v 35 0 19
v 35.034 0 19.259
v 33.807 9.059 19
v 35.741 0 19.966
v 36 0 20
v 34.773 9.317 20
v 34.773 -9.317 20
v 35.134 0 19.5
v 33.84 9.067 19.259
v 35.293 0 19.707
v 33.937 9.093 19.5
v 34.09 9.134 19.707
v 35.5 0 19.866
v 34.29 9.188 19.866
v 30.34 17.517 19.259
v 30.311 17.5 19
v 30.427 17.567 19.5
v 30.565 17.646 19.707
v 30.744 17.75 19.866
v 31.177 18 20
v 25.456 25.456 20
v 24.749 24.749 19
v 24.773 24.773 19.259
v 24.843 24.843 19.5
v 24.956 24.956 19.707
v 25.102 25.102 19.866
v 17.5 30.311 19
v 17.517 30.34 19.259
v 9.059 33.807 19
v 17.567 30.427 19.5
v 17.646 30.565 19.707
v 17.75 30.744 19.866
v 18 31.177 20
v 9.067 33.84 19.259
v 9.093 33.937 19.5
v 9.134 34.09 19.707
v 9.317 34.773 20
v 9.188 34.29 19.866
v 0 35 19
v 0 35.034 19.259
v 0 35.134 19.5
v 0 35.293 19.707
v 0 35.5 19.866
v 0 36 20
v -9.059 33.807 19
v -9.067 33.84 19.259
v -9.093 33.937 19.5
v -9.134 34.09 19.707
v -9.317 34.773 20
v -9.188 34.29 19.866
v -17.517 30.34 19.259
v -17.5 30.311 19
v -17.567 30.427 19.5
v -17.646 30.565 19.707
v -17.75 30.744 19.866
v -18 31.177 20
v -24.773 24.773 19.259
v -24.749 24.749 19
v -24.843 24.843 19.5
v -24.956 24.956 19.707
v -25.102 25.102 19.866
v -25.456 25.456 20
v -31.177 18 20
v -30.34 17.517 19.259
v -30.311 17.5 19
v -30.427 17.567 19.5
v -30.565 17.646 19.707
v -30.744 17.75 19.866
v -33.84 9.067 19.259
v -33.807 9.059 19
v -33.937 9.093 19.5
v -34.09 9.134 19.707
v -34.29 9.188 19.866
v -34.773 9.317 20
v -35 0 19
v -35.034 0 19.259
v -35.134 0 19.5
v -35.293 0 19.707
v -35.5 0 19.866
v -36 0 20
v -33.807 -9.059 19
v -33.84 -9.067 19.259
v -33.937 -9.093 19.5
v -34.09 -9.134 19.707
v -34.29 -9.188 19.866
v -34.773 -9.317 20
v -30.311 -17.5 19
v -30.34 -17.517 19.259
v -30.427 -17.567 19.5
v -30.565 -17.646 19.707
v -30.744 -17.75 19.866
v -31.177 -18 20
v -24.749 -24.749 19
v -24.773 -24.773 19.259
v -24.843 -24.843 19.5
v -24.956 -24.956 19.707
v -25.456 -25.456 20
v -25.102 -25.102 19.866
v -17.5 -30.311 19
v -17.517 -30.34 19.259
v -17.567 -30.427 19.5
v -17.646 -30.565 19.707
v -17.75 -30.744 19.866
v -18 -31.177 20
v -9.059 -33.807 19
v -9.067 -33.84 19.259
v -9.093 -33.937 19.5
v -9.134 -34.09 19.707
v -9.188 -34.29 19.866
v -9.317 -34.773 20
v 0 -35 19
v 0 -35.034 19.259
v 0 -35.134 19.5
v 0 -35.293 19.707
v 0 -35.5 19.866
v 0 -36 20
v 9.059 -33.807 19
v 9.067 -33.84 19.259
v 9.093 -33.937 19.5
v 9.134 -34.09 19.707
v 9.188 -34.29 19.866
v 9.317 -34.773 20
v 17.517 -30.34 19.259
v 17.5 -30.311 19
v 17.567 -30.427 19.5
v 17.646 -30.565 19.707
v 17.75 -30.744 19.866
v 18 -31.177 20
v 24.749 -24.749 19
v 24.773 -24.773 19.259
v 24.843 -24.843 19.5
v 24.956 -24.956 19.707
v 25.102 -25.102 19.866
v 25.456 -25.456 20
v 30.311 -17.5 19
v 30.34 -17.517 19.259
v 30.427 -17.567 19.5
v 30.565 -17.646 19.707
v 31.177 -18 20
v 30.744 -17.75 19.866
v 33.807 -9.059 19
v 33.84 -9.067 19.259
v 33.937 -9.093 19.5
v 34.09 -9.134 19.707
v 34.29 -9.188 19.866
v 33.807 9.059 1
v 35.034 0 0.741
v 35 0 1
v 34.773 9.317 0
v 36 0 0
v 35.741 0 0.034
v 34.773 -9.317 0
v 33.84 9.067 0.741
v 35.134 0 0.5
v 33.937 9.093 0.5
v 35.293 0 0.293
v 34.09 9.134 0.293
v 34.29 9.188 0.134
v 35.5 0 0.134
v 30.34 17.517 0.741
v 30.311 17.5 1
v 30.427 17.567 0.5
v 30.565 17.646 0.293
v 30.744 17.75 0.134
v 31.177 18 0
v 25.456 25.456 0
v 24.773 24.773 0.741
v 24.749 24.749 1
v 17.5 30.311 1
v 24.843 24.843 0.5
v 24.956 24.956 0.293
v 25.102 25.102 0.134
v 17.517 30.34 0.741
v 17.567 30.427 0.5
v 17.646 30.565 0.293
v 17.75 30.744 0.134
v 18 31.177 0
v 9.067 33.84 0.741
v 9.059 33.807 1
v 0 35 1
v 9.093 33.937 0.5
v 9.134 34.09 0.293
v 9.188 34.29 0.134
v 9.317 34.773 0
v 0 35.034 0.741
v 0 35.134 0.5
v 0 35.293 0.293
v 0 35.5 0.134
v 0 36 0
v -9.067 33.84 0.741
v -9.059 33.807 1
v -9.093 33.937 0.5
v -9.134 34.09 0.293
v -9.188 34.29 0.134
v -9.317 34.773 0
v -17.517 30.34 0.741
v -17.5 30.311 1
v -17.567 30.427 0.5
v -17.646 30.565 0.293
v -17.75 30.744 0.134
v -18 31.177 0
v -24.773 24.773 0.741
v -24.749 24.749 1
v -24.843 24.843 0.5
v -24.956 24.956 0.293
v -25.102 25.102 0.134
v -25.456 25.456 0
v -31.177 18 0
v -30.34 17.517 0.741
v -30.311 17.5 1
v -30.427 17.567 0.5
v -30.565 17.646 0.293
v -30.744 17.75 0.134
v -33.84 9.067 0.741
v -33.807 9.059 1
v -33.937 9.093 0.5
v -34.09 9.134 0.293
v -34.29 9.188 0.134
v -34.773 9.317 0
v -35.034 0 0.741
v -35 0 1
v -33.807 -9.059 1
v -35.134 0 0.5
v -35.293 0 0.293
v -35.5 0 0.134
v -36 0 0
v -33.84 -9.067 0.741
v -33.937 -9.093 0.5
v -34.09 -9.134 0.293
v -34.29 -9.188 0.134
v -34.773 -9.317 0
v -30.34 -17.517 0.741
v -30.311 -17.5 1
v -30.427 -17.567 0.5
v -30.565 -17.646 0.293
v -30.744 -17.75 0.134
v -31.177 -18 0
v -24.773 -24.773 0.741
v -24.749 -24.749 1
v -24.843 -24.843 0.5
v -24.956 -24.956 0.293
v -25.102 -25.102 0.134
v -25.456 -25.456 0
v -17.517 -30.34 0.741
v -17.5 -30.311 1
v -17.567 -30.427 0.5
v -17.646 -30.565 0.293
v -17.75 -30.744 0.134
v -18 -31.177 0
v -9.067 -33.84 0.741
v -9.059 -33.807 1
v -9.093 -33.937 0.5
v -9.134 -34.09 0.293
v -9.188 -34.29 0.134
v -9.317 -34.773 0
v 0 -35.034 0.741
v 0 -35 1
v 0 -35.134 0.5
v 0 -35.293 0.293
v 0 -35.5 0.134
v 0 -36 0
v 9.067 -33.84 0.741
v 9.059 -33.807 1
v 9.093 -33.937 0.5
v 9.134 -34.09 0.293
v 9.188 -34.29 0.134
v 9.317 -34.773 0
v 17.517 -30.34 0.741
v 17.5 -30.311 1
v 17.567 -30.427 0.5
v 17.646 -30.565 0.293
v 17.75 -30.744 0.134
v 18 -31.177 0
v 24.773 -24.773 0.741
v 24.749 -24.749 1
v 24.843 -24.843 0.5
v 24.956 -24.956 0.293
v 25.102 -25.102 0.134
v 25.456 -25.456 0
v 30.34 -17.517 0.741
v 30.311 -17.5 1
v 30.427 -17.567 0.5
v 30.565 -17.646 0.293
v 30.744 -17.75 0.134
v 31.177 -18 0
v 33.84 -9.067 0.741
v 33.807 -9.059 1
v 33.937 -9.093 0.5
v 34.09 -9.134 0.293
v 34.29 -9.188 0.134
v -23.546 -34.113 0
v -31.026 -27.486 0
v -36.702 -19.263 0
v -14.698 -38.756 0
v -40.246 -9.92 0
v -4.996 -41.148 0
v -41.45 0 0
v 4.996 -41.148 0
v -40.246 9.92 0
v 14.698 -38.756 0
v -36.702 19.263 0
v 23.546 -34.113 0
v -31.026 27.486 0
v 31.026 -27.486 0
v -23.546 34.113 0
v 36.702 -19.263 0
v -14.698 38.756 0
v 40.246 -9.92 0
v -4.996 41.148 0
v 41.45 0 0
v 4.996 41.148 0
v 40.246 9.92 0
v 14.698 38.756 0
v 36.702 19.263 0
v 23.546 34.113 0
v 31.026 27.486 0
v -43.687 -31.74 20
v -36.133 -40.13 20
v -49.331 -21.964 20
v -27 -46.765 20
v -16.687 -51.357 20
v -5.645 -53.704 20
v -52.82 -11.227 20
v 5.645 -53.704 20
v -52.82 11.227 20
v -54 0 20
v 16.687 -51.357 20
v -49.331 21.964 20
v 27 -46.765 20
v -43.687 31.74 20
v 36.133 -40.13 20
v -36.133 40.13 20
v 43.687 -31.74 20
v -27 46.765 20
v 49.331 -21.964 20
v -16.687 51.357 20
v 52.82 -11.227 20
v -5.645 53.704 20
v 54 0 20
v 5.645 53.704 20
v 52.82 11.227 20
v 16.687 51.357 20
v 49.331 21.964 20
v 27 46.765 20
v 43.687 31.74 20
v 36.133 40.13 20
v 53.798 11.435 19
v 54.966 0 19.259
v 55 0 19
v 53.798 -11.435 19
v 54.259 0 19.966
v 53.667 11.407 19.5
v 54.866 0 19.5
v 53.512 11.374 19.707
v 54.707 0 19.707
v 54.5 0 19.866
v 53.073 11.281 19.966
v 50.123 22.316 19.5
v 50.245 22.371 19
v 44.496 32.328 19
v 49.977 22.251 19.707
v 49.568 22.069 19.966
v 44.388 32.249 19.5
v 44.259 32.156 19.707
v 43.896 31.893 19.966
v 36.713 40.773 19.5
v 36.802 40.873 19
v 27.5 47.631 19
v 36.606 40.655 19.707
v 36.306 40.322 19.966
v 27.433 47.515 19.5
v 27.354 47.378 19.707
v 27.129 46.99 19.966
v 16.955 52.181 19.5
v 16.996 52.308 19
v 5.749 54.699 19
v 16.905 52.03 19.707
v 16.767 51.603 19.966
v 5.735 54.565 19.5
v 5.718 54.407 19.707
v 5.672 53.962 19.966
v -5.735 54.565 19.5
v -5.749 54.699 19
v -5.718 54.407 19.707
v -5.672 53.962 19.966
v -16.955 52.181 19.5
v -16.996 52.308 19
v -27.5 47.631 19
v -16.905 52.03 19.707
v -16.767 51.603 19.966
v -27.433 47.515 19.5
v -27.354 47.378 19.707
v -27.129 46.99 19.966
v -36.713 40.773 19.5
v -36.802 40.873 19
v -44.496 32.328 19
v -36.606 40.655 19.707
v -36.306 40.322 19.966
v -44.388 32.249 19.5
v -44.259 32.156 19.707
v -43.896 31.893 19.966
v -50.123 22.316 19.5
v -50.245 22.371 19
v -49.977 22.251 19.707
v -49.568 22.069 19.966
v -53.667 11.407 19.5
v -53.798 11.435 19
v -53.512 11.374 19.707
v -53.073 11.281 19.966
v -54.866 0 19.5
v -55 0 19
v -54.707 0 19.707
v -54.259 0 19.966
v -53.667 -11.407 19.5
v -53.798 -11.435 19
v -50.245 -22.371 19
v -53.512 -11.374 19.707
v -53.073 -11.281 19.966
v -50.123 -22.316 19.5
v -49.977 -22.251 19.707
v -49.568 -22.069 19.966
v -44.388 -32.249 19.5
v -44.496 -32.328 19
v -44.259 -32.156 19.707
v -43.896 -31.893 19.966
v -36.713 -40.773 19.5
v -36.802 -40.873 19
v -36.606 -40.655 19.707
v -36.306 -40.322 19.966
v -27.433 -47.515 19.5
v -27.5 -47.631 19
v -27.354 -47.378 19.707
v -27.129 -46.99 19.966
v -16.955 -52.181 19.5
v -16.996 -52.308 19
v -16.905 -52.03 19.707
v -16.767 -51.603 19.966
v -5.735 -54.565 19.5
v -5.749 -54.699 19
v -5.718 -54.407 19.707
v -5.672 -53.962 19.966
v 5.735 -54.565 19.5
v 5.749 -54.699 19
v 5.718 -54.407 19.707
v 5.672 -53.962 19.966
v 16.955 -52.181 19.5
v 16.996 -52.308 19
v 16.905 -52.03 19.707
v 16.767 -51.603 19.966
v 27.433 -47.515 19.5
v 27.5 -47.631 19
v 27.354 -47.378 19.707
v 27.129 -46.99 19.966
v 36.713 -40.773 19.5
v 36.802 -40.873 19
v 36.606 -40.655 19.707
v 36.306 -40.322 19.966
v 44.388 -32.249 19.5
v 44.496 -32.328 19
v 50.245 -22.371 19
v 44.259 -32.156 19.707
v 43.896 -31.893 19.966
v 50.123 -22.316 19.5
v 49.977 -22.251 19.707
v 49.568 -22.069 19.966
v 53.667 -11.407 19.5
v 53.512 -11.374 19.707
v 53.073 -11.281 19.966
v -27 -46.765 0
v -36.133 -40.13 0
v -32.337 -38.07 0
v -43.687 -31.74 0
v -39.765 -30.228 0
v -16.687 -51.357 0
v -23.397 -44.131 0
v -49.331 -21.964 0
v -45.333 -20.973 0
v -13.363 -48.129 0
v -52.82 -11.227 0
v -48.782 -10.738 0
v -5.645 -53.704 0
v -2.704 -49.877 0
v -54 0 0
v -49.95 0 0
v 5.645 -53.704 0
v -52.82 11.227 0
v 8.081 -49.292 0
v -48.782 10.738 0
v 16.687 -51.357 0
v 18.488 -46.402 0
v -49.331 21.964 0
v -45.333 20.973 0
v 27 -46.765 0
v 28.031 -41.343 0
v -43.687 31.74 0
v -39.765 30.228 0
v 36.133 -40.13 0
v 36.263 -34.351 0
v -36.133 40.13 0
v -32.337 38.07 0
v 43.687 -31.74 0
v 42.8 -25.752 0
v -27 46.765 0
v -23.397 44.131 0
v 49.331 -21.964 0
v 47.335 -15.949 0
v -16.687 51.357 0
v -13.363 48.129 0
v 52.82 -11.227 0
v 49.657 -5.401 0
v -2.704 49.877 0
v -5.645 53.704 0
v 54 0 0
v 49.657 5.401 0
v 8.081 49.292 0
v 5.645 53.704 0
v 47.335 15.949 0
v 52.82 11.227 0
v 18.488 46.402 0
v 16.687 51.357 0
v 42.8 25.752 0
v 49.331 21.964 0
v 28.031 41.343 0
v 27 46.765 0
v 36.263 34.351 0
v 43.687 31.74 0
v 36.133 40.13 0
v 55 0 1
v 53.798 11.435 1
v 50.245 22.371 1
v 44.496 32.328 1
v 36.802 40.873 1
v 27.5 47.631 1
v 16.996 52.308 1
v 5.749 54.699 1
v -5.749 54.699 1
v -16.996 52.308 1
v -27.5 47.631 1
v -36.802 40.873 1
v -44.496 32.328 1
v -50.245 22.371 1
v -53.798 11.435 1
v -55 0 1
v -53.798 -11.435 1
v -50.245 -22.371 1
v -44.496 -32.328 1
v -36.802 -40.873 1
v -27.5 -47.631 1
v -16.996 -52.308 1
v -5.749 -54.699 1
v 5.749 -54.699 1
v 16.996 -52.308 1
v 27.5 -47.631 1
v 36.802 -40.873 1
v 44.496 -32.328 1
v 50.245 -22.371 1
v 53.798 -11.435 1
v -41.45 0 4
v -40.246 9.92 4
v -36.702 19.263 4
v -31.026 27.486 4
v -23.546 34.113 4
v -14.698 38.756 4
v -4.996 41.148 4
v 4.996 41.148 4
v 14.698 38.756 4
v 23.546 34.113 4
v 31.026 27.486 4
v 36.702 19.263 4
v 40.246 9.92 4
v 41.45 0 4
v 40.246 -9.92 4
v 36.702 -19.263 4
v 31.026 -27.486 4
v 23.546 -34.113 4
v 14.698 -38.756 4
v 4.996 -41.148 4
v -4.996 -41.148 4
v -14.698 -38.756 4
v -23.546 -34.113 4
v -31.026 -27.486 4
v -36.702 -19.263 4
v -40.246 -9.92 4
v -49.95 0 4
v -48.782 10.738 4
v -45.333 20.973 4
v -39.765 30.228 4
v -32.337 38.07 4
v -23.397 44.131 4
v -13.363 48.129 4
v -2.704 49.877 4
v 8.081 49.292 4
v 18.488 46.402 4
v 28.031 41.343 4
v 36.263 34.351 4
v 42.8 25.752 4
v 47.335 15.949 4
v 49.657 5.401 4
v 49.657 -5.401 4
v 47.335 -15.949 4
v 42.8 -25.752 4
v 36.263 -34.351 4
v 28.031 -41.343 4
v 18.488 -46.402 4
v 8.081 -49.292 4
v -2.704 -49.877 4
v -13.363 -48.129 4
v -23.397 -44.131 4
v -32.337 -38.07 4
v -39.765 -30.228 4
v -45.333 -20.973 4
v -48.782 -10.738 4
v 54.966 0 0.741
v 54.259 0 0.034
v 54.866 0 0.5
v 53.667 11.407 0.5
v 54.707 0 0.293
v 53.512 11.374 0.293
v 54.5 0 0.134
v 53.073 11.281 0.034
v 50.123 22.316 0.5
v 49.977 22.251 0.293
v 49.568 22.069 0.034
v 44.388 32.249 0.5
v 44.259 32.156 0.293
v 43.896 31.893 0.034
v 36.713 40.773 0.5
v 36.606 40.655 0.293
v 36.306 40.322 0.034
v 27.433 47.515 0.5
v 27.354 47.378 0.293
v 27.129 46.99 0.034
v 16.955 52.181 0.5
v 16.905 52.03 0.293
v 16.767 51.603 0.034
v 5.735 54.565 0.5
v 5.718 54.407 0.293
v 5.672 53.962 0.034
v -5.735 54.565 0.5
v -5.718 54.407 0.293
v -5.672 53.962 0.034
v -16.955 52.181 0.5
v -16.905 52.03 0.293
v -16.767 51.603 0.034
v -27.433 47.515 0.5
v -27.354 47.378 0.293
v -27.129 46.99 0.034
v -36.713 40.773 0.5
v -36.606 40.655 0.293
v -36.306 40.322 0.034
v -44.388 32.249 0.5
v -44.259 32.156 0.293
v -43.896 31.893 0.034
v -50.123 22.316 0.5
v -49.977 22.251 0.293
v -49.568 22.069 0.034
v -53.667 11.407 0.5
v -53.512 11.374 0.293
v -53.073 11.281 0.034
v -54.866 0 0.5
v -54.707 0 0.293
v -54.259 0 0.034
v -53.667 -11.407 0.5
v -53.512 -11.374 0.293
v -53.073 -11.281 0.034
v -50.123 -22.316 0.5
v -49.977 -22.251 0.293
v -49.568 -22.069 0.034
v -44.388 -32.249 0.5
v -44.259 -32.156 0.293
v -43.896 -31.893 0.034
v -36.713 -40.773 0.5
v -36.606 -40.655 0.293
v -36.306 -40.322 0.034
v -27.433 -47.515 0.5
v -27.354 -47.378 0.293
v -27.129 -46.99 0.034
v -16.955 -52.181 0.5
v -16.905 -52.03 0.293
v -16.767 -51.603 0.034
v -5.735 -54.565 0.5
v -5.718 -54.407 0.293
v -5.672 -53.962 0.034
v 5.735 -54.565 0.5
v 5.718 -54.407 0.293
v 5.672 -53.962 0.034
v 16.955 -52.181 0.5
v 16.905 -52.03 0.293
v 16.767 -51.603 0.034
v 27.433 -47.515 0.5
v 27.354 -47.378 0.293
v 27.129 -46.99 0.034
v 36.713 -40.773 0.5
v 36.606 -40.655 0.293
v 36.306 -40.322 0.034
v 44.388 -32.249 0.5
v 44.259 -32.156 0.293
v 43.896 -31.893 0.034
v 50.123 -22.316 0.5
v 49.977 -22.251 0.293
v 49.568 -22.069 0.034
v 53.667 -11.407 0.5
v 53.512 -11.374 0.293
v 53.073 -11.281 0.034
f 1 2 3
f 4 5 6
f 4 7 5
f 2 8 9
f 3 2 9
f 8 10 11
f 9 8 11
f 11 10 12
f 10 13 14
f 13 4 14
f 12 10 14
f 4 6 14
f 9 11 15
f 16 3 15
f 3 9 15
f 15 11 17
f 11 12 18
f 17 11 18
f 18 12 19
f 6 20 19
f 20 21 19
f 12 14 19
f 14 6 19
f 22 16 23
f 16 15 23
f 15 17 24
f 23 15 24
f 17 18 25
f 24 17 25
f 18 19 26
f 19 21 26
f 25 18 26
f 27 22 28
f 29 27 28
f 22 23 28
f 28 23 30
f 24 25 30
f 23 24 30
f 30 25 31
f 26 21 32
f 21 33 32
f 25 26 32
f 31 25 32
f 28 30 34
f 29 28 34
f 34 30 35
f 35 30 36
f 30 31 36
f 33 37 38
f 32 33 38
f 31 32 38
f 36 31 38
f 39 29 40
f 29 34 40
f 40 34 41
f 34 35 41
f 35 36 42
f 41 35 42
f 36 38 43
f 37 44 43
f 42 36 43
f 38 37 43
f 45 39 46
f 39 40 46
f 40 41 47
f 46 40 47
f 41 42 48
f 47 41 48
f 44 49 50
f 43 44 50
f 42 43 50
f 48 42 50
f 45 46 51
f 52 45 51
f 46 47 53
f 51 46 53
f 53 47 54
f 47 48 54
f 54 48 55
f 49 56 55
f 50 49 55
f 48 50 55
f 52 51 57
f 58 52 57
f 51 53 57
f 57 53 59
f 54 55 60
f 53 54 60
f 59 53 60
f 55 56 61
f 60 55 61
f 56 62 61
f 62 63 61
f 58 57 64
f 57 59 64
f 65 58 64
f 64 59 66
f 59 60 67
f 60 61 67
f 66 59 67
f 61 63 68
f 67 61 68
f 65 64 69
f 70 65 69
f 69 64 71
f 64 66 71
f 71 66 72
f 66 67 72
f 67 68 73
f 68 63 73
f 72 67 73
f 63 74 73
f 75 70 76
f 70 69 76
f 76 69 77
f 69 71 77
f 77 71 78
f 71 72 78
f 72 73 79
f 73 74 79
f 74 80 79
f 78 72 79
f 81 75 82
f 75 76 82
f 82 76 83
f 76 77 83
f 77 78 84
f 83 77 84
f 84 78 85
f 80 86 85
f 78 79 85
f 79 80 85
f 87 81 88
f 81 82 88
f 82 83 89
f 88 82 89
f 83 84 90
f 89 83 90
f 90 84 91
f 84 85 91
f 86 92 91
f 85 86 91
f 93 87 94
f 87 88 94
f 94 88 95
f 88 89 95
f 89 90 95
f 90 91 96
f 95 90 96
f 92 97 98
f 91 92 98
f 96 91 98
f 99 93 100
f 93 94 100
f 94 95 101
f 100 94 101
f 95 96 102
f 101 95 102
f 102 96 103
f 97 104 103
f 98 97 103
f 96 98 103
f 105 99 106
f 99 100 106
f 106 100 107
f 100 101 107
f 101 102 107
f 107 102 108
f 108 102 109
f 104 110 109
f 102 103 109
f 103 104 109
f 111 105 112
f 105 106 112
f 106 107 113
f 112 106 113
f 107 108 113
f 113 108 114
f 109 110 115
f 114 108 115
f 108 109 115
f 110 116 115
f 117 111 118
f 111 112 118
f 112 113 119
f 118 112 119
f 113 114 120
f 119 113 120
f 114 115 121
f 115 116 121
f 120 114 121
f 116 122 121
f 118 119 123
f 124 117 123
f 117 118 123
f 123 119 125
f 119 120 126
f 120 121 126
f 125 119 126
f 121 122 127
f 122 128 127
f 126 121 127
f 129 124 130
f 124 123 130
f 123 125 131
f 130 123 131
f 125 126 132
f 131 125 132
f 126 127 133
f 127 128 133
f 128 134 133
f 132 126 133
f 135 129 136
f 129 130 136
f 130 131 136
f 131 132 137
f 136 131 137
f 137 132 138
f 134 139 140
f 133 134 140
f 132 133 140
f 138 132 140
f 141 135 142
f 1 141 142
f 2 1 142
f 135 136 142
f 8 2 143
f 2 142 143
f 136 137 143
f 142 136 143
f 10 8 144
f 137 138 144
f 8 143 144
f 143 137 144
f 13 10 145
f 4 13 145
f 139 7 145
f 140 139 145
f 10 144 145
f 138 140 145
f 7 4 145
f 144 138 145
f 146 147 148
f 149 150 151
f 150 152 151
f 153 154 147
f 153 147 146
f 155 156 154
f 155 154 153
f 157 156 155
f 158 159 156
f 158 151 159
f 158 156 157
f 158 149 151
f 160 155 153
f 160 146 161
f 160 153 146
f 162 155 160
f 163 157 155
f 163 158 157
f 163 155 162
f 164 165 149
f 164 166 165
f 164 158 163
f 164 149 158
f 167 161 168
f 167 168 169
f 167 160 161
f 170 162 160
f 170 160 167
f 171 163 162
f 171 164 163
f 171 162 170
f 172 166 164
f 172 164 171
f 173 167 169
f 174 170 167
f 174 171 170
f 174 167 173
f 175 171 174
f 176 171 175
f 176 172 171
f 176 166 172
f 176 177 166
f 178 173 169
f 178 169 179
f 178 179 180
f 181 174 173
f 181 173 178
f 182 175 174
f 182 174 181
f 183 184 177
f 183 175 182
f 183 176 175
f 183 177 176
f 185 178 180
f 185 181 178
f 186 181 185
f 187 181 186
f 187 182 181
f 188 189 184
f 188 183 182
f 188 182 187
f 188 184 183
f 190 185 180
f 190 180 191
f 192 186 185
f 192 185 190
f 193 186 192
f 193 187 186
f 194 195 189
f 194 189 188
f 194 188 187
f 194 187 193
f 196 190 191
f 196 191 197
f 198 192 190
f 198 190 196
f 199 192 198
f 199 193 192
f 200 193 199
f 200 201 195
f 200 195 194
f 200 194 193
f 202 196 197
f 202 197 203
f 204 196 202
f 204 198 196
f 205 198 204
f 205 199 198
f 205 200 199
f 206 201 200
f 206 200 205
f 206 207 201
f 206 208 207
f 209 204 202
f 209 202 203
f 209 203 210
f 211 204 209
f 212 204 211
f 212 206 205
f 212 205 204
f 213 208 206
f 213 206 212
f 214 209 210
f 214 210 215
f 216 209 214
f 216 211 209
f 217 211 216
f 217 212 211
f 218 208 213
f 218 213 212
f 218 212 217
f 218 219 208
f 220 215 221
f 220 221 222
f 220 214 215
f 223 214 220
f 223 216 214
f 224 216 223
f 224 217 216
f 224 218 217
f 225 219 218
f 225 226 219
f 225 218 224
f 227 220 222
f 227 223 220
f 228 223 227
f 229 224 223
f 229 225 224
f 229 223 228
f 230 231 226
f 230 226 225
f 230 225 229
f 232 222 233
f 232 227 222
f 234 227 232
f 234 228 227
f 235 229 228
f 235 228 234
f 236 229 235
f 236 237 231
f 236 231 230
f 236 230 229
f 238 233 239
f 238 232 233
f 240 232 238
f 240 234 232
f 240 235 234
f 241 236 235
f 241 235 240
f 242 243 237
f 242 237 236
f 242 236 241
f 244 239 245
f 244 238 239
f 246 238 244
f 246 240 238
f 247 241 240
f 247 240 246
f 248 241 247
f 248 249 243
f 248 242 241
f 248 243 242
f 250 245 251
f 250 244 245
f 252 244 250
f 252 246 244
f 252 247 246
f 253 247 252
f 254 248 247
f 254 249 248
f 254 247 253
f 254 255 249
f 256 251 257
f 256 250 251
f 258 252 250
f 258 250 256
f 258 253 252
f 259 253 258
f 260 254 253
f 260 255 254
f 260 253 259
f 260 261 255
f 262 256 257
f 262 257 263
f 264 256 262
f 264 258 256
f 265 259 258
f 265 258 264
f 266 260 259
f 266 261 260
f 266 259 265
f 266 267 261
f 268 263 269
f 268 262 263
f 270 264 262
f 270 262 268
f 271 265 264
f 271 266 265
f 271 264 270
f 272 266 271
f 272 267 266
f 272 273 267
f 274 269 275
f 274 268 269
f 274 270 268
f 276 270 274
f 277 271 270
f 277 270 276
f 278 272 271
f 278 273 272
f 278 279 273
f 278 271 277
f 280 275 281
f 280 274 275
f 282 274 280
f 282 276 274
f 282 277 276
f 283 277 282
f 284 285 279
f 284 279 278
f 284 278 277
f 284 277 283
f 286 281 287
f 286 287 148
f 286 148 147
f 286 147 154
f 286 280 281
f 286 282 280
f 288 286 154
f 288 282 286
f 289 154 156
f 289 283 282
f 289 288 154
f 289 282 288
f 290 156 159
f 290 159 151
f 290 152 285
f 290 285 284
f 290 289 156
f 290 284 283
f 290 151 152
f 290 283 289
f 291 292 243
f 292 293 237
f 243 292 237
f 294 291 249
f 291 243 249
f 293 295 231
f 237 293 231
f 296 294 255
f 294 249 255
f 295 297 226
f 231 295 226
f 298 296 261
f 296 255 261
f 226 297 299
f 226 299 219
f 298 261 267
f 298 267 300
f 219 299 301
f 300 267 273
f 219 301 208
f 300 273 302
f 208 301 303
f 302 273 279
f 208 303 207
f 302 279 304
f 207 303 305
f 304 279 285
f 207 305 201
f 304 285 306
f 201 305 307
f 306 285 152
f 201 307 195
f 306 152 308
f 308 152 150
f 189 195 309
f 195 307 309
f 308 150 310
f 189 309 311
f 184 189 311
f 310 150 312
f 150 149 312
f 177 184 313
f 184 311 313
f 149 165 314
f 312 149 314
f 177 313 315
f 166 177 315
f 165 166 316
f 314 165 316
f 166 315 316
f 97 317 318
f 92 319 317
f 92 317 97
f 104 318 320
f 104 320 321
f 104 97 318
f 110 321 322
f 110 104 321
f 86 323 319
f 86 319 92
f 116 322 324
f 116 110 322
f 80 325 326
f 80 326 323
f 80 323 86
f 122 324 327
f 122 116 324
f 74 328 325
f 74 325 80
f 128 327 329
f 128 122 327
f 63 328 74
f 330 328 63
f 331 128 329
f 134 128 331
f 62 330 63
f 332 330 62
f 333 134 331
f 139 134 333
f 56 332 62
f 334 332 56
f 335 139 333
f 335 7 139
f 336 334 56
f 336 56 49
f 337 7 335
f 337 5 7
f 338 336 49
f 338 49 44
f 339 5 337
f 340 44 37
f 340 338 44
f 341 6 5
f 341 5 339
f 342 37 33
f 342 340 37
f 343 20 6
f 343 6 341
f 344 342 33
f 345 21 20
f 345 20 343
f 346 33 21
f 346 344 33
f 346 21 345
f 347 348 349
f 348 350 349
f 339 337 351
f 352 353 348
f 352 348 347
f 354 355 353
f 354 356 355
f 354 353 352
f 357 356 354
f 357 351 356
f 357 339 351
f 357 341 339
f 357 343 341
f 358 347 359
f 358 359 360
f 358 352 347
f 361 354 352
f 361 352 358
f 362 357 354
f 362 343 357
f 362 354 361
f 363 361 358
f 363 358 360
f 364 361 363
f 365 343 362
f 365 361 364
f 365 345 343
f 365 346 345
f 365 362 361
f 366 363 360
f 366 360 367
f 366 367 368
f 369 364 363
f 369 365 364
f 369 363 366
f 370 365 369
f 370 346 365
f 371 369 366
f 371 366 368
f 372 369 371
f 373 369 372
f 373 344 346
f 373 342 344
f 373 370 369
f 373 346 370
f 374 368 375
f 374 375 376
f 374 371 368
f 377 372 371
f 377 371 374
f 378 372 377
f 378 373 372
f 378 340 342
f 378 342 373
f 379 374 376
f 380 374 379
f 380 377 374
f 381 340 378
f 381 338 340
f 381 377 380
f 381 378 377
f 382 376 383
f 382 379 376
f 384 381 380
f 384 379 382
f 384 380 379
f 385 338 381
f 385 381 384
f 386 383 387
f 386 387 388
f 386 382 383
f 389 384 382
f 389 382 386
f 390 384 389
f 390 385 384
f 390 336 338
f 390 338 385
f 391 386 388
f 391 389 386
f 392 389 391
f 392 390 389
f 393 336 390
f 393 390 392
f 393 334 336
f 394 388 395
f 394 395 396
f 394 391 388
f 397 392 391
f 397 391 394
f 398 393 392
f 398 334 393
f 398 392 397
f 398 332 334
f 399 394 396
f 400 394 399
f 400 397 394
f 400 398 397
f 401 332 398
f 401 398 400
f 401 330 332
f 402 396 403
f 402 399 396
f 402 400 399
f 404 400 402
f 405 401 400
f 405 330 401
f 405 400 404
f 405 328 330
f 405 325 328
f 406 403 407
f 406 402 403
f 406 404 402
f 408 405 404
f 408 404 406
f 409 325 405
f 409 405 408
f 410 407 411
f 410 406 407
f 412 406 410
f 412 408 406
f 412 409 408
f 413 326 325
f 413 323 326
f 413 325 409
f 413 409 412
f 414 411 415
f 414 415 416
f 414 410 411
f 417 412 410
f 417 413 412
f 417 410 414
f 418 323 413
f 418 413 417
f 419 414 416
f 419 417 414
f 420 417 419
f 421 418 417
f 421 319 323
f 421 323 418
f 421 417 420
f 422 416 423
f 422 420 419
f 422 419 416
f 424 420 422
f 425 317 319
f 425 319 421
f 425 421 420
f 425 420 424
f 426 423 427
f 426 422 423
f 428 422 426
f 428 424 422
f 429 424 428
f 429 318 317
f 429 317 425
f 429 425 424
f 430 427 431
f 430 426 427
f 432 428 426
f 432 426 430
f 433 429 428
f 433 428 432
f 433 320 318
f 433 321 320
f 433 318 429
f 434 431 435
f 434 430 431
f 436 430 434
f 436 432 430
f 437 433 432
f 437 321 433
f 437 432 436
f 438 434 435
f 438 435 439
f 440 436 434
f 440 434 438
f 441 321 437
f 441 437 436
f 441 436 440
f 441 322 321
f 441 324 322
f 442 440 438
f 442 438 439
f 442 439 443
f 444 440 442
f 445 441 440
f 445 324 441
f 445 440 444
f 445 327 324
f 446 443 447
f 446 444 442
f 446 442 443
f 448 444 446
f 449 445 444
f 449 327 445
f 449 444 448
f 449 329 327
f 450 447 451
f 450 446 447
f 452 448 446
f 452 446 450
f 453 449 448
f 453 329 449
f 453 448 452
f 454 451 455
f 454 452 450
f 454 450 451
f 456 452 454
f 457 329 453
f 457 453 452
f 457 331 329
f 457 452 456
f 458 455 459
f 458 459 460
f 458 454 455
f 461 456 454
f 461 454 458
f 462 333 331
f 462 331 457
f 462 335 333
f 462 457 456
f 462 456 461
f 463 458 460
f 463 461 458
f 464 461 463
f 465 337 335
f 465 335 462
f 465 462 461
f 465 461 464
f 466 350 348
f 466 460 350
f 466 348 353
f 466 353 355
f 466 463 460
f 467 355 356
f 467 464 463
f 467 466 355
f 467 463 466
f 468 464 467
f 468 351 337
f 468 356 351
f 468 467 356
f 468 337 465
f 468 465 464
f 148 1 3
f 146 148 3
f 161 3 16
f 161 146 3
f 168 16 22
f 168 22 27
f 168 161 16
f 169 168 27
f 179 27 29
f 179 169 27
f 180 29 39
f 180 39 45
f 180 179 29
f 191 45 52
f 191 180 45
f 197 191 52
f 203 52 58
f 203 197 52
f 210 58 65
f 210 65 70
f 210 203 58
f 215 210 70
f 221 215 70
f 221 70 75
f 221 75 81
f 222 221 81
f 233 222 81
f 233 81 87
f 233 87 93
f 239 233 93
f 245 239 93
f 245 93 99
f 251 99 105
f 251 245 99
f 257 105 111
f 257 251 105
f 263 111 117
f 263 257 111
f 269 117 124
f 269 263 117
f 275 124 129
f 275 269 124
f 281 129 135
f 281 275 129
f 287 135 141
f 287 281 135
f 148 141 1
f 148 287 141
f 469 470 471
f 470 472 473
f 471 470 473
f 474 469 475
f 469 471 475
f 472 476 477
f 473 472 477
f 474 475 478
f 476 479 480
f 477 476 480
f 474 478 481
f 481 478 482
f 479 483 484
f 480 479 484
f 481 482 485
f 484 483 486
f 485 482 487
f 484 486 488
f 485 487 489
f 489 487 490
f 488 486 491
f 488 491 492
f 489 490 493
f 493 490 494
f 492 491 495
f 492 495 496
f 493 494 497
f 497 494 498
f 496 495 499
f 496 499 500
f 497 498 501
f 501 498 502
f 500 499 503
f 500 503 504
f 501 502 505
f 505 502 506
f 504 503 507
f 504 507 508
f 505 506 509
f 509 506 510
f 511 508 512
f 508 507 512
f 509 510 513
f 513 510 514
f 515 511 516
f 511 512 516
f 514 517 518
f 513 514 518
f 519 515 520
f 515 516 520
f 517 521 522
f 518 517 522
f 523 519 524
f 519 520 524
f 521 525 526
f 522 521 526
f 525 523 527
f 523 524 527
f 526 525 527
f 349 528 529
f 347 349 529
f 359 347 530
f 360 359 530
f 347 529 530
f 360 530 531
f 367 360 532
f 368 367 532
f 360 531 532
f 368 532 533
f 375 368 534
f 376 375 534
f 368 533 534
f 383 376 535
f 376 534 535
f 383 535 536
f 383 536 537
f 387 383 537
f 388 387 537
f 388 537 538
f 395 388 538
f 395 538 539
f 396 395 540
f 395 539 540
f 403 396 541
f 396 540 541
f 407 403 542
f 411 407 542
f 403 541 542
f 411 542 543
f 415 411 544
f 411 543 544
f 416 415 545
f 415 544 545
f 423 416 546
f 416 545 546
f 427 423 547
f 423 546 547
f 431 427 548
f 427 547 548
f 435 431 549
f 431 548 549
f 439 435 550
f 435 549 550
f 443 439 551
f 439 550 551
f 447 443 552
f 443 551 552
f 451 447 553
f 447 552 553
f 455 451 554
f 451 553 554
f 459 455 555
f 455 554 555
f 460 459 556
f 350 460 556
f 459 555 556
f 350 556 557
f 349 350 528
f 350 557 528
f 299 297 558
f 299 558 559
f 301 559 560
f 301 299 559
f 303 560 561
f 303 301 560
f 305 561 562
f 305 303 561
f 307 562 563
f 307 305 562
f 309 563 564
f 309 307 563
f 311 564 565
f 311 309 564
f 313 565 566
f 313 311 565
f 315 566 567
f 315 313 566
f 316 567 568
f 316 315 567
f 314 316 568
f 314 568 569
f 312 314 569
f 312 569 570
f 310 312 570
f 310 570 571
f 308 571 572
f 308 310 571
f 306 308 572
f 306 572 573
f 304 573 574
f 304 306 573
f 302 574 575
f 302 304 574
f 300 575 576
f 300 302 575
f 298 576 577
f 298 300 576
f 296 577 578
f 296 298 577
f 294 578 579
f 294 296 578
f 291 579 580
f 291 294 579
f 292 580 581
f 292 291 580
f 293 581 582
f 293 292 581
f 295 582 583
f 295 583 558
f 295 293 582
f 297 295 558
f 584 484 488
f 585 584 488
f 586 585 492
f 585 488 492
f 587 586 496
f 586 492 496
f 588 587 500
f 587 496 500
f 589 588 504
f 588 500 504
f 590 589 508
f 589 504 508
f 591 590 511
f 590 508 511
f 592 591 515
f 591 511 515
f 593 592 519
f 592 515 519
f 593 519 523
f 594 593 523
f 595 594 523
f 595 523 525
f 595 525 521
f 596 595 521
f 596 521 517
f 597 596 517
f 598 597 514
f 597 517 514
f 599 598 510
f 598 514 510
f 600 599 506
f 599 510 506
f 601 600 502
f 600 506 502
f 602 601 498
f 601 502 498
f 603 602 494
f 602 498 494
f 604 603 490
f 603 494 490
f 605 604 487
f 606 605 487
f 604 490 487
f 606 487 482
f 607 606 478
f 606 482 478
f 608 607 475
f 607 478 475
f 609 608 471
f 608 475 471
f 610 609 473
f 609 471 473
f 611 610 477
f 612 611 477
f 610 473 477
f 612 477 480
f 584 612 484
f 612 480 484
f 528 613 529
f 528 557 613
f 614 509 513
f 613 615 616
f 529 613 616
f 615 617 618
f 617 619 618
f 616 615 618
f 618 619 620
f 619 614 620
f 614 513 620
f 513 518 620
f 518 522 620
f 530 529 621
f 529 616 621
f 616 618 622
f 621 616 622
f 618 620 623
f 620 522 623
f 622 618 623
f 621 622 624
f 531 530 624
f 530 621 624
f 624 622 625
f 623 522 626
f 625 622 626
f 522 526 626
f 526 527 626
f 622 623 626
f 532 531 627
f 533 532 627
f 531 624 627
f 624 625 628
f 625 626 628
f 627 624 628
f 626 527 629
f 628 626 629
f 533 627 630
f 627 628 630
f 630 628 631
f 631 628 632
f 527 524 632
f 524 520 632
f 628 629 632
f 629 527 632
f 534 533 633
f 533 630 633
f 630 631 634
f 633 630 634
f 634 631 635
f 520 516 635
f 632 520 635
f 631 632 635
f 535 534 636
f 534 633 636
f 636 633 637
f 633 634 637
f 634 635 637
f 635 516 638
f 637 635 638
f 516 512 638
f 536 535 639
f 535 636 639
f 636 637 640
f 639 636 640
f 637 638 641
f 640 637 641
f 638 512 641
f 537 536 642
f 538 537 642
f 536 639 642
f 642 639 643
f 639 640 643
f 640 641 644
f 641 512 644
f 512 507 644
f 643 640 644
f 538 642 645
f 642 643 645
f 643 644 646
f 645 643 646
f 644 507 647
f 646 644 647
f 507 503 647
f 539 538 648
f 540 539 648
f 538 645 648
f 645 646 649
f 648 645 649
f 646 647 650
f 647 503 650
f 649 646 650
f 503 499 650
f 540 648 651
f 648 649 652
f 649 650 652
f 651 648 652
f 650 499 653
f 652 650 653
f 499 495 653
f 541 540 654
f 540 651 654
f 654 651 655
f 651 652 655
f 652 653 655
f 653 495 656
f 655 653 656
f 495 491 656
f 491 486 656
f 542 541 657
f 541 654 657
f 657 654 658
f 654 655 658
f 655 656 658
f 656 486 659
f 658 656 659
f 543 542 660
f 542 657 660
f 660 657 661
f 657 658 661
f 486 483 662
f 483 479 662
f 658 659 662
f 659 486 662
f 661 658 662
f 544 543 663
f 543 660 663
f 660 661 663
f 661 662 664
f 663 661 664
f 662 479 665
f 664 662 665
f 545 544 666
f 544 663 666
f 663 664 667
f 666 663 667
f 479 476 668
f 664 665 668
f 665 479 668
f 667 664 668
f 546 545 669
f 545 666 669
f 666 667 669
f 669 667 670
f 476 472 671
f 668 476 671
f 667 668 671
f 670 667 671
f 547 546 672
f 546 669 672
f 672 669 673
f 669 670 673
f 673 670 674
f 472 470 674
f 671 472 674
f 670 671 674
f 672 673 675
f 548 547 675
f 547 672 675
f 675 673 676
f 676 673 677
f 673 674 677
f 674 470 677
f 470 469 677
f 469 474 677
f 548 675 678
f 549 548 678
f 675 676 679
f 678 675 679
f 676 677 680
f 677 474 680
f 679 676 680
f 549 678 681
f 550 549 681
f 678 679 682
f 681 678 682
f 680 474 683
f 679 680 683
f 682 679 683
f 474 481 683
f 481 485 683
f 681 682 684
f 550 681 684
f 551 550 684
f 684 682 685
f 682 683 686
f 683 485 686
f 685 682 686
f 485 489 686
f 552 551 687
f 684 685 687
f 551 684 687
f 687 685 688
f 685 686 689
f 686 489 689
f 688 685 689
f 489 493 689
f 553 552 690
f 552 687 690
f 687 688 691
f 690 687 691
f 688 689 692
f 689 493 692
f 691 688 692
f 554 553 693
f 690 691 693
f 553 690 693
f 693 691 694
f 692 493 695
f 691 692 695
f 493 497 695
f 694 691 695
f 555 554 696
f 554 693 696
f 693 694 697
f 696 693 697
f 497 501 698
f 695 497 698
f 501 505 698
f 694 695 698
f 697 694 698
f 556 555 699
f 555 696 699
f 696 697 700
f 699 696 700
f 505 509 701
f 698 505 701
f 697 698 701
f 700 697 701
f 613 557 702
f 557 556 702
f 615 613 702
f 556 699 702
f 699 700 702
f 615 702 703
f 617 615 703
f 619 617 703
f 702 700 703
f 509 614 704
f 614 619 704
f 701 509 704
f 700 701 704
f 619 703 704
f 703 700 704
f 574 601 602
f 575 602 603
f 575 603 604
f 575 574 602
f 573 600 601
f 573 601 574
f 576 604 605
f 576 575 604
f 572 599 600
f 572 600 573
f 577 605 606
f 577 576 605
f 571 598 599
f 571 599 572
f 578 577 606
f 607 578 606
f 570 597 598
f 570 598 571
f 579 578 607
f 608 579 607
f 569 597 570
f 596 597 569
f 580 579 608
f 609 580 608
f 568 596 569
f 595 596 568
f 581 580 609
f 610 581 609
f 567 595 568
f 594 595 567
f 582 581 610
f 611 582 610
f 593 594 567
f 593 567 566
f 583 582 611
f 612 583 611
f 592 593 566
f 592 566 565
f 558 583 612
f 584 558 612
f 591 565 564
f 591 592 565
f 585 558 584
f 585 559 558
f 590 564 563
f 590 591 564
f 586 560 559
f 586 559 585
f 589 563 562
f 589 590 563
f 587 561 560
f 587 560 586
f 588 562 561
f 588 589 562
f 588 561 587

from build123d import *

# Parameters (mm, degrees)
ESQUISSE1_R             = 55
ESQUISSE1_R_2           = 35
BOSS_EXTRU_1_DEPTH      = 20
CONG_6_R                = 1
ESQUISSE3_R             = 49.95
ESQUISSE3_R_2           = 41.45
ENL_V_MAT_EXTRU_1_DEPTH = 4


with BuildPart() as part:
    # Esquisse1 → Boss.-Extru.1 (new body)
    with BuildSketch(Plane.XY):
        Circle(ESQUISSE1_R)
        Circle(ESQUISSE1_R_2, mode=Mode.SUBTRACT)
    extrude(amount=BOSS_EXTRU_1_DEPTH)

    # Congé6
    cong_6_edges = [part.edges().sort_by_distance(p)[0] for p in [
        (-55, 0, 0),
        (-55, 0, 20),
        (-35, 0, 0),
        (-35, 0, 20),
    ]]
    fillet(cong_6_edges, radius=CONG_6_R)

    # Esquisse3 → Enlèv. mat.-Extru.1 (cut)
    with BuildSketch(Plane(origin=(0, 0, 0), x_dir=(-1, 0, 0), z_dir=(0, 0, -1))):
        Circle(ESQUISSE3_R)
        Circle(ESQUISSE3_R_2, mode=Mode.SUBTRACT)
    extrude(amount=-ENL_V_MAT_EXTRU_1_DEPTH, mode=Mode.SUBTRACT)


solid = part.part
